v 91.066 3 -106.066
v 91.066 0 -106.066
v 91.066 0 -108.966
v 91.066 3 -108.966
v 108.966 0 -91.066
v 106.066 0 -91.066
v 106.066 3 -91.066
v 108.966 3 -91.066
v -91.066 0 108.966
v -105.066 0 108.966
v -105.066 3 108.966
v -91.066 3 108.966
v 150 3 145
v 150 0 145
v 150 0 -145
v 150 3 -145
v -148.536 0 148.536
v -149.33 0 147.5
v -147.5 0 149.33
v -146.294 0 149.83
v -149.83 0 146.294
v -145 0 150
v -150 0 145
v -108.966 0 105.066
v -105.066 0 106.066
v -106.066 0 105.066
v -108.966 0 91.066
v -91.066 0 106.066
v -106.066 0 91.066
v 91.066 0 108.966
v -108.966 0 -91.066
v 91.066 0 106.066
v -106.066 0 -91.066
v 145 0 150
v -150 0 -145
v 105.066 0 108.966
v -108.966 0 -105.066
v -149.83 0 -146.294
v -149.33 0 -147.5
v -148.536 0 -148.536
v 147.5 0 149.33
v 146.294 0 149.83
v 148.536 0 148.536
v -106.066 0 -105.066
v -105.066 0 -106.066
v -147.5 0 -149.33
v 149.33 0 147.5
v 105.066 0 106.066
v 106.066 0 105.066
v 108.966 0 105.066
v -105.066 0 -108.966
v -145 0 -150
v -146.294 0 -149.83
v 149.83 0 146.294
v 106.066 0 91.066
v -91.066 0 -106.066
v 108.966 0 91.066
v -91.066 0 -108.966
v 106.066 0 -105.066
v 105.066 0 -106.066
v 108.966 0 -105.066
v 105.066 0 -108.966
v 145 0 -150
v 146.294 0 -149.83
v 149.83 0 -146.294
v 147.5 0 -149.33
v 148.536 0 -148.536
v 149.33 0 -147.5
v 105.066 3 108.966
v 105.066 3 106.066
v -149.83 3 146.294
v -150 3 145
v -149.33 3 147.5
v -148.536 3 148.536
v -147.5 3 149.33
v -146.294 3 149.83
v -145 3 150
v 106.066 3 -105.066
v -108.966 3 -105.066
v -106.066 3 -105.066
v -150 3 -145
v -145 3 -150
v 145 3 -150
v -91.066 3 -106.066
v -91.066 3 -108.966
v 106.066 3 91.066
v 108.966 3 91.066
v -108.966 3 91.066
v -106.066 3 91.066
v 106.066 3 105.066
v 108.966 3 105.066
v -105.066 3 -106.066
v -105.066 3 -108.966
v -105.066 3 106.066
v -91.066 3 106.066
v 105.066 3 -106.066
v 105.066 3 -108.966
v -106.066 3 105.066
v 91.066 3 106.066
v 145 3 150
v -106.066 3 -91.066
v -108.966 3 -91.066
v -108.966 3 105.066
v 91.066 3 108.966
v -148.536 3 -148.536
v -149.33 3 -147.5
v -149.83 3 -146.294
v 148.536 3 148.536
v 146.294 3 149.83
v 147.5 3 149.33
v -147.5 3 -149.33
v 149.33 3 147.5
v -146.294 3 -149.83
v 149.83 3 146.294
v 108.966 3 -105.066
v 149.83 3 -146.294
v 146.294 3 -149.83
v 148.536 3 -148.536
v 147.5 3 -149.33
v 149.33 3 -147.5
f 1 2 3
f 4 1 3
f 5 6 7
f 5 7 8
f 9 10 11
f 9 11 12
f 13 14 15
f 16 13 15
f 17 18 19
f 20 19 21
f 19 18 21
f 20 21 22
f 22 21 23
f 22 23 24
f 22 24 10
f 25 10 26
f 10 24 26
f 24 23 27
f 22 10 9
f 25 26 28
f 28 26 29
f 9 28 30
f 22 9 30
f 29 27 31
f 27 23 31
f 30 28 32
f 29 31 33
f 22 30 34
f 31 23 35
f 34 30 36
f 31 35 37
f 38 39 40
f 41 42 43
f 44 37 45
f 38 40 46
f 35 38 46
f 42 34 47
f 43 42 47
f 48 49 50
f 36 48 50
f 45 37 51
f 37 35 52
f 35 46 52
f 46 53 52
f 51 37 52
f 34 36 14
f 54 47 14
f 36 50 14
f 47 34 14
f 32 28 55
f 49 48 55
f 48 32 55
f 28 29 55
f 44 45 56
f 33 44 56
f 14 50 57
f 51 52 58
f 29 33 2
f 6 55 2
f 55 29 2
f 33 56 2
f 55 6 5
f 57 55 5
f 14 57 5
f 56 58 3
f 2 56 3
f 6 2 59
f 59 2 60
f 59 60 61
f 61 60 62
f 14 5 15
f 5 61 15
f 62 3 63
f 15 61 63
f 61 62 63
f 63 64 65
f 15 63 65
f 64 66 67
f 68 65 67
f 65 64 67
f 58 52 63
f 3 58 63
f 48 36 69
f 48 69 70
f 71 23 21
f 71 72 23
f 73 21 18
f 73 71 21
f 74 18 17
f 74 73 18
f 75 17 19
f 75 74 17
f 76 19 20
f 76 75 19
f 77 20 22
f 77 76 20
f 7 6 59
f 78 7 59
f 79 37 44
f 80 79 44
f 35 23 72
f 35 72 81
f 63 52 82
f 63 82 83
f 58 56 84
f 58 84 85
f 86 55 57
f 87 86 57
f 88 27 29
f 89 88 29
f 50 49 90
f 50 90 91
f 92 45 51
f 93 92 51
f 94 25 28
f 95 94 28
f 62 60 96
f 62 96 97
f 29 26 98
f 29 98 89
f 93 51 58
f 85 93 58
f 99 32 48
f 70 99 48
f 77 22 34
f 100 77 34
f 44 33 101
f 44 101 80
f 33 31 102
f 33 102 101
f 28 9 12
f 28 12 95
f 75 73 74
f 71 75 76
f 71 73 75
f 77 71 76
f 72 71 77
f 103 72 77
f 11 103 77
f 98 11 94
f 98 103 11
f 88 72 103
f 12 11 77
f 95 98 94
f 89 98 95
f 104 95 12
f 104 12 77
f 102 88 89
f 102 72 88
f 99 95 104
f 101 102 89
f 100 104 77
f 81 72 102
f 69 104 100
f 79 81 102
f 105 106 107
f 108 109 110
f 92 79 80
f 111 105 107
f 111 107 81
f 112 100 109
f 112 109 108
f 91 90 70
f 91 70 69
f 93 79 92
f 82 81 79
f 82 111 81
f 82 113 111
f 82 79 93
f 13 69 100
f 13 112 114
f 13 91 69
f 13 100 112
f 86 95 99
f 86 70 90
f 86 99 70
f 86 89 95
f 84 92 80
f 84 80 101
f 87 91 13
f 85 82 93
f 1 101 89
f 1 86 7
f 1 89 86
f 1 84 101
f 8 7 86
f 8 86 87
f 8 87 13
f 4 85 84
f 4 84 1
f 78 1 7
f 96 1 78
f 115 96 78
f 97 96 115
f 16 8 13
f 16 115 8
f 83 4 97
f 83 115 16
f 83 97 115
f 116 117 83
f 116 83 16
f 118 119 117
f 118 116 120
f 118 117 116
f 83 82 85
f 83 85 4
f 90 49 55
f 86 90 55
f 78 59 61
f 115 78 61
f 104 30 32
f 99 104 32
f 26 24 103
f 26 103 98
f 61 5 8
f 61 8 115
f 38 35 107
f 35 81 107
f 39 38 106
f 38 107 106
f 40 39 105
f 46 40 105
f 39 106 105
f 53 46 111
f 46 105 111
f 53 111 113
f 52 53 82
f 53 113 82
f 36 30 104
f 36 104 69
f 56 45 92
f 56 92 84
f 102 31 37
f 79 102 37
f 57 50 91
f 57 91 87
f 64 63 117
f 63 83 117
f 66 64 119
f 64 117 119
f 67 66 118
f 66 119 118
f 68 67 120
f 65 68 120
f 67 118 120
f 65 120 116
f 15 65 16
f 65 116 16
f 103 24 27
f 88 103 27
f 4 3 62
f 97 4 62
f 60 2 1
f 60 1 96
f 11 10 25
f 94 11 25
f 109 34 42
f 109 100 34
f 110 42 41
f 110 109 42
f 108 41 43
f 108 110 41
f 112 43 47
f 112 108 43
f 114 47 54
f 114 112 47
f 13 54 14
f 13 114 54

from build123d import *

# Parameters (mm, degrees)
SKETCH1_W           = 300
SKETCH1_H           = 300
SKETCH1_W_2         = 2.9
SKETCH1_H_2         = 14
SKETCH1_W_3         = 14
SKETCH1_H_3         = 2.9
BOSS_EXTRUDE1_DEPTH = 3
FILLET1_R           = 5


with BuildPart() as part:
    # Sketch1 → Boss-Extrude1 (new body)
    with BuildSketch(Plane(origin=(0, 0, 0), x_dir=(1, 0, 0), z_dir=(0, 1, 0))):
        Rectangle(SKETCH1_W, SKETCH1_H)
        with Locations((107.516017178, -98.066017178)):
            Rectangle(SKETCH1_W_2, SKETCH1_H_2, mode=Mode.SUBTRACT)
        with Locations((98.066017178, 107.516017178)):
            Rectangle(SKETCH1_W_3, SKETCH1_H_3, mode=Mode.SUBTRACT)
        with Locations((107.516017178, 98.066017178)):
            Rectangle(SKETCH1_W_2, SKETCH1_H_2, mode=Mode.SUBTRACT)
        with Locations((98.066017178, -107.516017178)):
            Rectangle(SKETCH1_W_3, SKETCH1_H_3, mode=Mode.SUBTRACT)
        with Locations((-98.066017178, -107.516017178)):
            Rectangle(SKETCH1_W_3, SKETCH1_H_3, mode=Mode.SUBTRACT)
        with Locations((-107.516017178, -98.066017178)):
            Rectangle(SKETCH1_W_2, SKETCH1_H_2, mode=Mode.SUBTRACT)
        with Locations((-107.516017178, 98.066017178)):
            Rectangle(SKETCH1_W_2, SKETCH1_H_2, mode=Mode.SUBTRACT)
        with Locations((-98.066017178, 107.516017178)):
            Rectangle(SKETCH1_W_3, SKETCH1_H_3, mode=Mode.SUBTRACT)
    extrude(amount=BOSS_EXTRUDE1_DEPTH)

    # Fillet1
    fillet1_edges = [part.edges().sort_by_distance(p)[0] for p in [
        (-150, 1.5, -150),
        (150, 1.5, -150),
        (150, 1.5, 150),
        (-150, 1.5, 150),
    ]]
    fillet(fillet1_edges, radius=FILLET1_R)


solid = part.part
